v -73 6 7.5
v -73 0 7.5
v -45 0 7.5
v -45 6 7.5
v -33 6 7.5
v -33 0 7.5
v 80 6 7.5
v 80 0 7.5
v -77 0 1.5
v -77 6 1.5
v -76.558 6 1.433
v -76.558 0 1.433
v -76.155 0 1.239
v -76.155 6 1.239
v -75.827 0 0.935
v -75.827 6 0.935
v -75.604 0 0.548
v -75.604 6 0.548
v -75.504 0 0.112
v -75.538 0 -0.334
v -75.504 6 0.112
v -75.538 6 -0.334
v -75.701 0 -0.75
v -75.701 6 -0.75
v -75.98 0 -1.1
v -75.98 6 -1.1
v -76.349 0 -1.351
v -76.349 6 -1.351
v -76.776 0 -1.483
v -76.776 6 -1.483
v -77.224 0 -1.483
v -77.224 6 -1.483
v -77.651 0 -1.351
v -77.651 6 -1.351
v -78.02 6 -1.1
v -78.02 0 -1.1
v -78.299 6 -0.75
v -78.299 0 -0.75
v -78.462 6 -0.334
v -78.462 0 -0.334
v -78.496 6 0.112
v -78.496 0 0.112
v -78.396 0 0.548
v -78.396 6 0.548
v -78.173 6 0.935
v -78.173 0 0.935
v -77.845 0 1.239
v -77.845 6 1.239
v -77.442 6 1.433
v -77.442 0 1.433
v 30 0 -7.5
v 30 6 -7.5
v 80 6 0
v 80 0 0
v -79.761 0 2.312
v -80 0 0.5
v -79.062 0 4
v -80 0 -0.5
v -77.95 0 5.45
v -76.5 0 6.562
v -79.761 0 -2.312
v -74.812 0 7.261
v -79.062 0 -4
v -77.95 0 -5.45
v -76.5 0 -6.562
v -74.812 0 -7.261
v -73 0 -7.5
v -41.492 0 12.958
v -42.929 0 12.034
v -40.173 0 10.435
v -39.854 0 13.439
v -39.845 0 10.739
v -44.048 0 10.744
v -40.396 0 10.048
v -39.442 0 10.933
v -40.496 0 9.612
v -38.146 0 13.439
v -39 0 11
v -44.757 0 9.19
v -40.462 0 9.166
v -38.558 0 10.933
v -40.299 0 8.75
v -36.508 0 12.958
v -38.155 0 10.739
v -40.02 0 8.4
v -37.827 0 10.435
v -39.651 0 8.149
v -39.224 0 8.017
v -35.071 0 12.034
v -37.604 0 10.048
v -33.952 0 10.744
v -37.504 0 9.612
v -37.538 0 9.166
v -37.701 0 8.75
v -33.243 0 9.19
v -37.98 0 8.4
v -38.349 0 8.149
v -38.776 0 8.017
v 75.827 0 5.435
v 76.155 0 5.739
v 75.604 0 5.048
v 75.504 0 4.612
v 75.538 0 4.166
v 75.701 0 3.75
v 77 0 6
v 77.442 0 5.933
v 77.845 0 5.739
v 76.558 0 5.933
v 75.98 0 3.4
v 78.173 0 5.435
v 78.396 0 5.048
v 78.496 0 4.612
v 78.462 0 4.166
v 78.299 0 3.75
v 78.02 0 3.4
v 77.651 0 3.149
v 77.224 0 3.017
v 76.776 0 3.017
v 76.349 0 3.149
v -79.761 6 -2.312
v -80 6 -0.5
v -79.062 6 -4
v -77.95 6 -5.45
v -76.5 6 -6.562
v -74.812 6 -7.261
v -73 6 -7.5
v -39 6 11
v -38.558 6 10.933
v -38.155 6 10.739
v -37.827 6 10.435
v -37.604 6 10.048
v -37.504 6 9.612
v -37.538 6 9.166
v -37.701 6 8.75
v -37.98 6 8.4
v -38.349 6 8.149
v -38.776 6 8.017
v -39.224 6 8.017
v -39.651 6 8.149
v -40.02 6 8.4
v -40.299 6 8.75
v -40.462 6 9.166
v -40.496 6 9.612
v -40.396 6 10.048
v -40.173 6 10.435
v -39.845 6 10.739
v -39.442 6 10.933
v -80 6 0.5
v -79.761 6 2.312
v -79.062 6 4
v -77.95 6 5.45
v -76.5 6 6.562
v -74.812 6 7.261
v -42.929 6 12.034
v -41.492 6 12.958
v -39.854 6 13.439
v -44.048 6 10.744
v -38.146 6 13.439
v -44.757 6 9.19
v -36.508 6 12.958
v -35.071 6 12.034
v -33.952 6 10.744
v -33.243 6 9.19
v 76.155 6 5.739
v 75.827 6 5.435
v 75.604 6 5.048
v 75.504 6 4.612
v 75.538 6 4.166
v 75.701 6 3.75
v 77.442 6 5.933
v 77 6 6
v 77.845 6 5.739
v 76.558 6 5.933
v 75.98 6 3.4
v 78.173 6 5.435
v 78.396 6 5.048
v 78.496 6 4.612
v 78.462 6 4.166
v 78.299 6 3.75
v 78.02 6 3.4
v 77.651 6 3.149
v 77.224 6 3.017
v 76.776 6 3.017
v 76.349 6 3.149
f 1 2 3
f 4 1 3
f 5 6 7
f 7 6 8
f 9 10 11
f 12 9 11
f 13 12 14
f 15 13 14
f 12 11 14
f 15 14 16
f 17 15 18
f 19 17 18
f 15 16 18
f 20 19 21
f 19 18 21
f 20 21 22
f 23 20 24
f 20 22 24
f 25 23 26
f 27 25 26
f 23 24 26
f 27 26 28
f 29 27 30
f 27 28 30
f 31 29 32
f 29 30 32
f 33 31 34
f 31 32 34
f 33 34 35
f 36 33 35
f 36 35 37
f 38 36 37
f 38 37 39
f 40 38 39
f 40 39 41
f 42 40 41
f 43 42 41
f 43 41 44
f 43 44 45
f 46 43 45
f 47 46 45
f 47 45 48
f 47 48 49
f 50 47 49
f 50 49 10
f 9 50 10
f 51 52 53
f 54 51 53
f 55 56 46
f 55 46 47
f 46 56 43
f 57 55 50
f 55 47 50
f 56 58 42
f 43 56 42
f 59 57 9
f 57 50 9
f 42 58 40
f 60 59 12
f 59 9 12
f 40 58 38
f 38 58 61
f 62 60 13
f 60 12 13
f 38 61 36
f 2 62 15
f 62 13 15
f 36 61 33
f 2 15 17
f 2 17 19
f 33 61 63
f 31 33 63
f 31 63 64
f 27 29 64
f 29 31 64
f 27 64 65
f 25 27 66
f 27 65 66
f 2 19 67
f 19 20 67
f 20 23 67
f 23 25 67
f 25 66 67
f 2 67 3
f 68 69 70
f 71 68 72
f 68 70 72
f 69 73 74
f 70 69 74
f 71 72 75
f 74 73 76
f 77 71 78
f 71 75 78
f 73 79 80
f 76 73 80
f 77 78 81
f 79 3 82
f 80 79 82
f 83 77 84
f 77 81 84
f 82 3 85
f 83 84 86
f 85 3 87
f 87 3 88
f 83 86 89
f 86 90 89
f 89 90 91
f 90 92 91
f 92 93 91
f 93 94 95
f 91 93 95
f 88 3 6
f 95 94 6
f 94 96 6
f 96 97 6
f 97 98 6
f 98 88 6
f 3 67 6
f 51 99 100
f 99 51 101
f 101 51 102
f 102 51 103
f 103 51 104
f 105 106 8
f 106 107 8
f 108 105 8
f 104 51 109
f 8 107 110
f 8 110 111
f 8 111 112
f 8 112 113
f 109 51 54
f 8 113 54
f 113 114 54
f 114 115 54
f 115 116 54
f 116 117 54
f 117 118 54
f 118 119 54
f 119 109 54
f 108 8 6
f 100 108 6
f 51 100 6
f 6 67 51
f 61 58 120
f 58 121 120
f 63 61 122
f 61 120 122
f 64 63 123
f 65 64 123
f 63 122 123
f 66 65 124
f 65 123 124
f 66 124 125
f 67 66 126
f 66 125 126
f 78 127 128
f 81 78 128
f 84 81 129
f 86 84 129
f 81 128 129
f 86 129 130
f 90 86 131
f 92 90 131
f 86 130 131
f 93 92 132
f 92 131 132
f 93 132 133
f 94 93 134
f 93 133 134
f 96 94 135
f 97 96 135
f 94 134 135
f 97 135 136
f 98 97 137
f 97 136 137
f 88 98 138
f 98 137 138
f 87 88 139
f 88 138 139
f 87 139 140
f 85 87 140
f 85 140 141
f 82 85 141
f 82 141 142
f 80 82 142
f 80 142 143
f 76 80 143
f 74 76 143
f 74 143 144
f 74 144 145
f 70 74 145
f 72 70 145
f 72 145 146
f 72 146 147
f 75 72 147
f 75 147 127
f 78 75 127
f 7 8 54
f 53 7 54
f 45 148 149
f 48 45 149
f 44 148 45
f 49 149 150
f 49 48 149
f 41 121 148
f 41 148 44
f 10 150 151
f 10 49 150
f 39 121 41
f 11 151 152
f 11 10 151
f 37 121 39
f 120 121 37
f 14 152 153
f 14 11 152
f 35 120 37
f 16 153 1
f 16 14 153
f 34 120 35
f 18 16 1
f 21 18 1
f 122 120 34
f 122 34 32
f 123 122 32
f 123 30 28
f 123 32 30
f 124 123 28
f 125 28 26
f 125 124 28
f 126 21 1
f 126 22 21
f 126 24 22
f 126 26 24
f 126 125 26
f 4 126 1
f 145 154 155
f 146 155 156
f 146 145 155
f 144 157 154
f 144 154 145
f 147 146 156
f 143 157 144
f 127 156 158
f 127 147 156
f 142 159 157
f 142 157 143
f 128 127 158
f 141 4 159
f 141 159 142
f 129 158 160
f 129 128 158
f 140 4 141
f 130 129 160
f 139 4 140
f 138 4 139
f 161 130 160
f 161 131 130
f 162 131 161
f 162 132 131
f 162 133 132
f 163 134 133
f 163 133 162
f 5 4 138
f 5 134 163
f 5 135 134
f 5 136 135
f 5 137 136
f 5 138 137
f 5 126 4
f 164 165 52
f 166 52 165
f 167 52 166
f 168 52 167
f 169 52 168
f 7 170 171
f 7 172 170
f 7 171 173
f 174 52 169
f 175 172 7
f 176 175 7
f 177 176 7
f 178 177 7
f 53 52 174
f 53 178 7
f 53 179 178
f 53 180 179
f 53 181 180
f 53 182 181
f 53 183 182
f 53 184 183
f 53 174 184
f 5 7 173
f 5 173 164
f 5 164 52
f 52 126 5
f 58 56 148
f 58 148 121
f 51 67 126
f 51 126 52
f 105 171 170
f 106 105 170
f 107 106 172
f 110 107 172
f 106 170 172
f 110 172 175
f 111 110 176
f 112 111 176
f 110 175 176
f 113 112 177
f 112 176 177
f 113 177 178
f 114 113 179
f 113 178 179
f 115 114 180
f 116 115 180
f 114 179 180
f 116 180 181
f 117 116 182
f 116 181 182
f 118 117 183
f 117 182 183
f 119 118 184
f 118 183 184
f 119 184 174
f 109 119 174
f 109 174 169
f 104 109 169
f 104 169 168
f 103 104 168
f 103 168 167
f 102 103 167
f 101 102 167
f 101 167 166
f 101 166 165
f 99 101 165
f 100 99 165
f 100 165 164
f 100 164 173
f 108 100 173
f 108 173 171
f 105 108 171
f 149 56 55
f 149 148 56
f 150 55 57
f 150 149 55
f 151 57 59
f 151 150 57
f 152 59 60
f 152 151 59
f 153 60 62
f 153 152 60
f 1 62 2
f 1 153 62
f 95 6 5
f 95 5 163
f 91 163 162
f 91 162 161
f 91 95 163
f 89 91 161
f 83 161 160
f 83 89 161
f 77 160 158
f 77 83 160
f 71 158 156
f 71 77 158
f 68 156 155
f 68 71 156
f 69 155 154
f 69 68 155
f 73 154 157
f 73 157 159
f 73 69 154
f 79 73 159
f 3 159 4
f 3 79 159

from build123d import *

# Parameters (mm, degrees)
SKETCH2_W           = 160
SKETCH2_H           = 15
BOSS_EXTRUDE1_DEPTH = 6
BOSS_EXTRUDE2_DEPTH = 6
SKETCH5_R           = 1.5
CUT_EXTRUDE1_DEPTH  = 82.352627493
CUT_EXTRUDE2_DEPTH  = 82.352627493
FILLET1_R           = 7


with BuildPart() as part:
    # Sketch2 → Boss-Extrude1 (new body)
    with BuildSketch(Plane(origin=(0, 0, 0), x_dir=(1, 0, 0), z_dir=(0, 1, 0))):
        Rectangle(SKETCH2_W, SKETCH2_H)
    extrude(amount=BOSS_EXTRUDE1_DEPTH)

    # Sketch4 → Boss-Extrude2 (add)
    with BuildSketch(Plane(origin=(0, 0, 0), x_dir=(1, 0, 0), z_dir=(0, 1, 0))):
        with BuildLine():
            Line((-45, -7.5), (-33, -7.5))
            ThreePointArc((-33, -7.5), (-39, -13.5), (-45, -7.5))
        make_face()
    extrude(amount=BOSS_EXTRUDE2_DEPTH)

    # Sketch5 → Cut-Extrude1 (cut, through all)
    with BuildSketch(Plane(origin=(0, 6, 0), x_dir=(1, 0, 0), z_dir=(0, 1, 0))):
        with Locations(Location((-77, 0, 0), (0, 0, 270))):
            Circle(SKETCH5_R)
        with Locations(Location((-39, -9.5, 0), (0, 0, 270))):
            Circle(SKETCH5_R)
        with Locations(Location((77, -4.5, 0), (0, 0, 270))):
            Circle(SKETCH5_R)
    extrude(amount=-CUT_EXTRUDE1_DEPTH, mode=Mode.SUBTRACT)

    # Sketch6 → Cut-Extrude2 (cut, through all)
    with BuildSketch(Plane(origin=(0, 6, 0), x_dir=(1, 0, 0), z_dir=(0, 1, 0))):
        Polygon((80, 0), (80, 7.5), (30, 7.5), align=None)
    extrude(amount=-CUT_EXTRUDE2_DEPTH, mode=Mode.SUBTRACT)

    # Fillet1
    fillet1_edges = [part.edges().sort_by_distance(p)[0] for p in [
        (-80, 3, -7.5),
        (-80, 3, 7.5),
    ]]
    fillet(fillet1_edges, radius=FILLET1_R)


solid = part.part
